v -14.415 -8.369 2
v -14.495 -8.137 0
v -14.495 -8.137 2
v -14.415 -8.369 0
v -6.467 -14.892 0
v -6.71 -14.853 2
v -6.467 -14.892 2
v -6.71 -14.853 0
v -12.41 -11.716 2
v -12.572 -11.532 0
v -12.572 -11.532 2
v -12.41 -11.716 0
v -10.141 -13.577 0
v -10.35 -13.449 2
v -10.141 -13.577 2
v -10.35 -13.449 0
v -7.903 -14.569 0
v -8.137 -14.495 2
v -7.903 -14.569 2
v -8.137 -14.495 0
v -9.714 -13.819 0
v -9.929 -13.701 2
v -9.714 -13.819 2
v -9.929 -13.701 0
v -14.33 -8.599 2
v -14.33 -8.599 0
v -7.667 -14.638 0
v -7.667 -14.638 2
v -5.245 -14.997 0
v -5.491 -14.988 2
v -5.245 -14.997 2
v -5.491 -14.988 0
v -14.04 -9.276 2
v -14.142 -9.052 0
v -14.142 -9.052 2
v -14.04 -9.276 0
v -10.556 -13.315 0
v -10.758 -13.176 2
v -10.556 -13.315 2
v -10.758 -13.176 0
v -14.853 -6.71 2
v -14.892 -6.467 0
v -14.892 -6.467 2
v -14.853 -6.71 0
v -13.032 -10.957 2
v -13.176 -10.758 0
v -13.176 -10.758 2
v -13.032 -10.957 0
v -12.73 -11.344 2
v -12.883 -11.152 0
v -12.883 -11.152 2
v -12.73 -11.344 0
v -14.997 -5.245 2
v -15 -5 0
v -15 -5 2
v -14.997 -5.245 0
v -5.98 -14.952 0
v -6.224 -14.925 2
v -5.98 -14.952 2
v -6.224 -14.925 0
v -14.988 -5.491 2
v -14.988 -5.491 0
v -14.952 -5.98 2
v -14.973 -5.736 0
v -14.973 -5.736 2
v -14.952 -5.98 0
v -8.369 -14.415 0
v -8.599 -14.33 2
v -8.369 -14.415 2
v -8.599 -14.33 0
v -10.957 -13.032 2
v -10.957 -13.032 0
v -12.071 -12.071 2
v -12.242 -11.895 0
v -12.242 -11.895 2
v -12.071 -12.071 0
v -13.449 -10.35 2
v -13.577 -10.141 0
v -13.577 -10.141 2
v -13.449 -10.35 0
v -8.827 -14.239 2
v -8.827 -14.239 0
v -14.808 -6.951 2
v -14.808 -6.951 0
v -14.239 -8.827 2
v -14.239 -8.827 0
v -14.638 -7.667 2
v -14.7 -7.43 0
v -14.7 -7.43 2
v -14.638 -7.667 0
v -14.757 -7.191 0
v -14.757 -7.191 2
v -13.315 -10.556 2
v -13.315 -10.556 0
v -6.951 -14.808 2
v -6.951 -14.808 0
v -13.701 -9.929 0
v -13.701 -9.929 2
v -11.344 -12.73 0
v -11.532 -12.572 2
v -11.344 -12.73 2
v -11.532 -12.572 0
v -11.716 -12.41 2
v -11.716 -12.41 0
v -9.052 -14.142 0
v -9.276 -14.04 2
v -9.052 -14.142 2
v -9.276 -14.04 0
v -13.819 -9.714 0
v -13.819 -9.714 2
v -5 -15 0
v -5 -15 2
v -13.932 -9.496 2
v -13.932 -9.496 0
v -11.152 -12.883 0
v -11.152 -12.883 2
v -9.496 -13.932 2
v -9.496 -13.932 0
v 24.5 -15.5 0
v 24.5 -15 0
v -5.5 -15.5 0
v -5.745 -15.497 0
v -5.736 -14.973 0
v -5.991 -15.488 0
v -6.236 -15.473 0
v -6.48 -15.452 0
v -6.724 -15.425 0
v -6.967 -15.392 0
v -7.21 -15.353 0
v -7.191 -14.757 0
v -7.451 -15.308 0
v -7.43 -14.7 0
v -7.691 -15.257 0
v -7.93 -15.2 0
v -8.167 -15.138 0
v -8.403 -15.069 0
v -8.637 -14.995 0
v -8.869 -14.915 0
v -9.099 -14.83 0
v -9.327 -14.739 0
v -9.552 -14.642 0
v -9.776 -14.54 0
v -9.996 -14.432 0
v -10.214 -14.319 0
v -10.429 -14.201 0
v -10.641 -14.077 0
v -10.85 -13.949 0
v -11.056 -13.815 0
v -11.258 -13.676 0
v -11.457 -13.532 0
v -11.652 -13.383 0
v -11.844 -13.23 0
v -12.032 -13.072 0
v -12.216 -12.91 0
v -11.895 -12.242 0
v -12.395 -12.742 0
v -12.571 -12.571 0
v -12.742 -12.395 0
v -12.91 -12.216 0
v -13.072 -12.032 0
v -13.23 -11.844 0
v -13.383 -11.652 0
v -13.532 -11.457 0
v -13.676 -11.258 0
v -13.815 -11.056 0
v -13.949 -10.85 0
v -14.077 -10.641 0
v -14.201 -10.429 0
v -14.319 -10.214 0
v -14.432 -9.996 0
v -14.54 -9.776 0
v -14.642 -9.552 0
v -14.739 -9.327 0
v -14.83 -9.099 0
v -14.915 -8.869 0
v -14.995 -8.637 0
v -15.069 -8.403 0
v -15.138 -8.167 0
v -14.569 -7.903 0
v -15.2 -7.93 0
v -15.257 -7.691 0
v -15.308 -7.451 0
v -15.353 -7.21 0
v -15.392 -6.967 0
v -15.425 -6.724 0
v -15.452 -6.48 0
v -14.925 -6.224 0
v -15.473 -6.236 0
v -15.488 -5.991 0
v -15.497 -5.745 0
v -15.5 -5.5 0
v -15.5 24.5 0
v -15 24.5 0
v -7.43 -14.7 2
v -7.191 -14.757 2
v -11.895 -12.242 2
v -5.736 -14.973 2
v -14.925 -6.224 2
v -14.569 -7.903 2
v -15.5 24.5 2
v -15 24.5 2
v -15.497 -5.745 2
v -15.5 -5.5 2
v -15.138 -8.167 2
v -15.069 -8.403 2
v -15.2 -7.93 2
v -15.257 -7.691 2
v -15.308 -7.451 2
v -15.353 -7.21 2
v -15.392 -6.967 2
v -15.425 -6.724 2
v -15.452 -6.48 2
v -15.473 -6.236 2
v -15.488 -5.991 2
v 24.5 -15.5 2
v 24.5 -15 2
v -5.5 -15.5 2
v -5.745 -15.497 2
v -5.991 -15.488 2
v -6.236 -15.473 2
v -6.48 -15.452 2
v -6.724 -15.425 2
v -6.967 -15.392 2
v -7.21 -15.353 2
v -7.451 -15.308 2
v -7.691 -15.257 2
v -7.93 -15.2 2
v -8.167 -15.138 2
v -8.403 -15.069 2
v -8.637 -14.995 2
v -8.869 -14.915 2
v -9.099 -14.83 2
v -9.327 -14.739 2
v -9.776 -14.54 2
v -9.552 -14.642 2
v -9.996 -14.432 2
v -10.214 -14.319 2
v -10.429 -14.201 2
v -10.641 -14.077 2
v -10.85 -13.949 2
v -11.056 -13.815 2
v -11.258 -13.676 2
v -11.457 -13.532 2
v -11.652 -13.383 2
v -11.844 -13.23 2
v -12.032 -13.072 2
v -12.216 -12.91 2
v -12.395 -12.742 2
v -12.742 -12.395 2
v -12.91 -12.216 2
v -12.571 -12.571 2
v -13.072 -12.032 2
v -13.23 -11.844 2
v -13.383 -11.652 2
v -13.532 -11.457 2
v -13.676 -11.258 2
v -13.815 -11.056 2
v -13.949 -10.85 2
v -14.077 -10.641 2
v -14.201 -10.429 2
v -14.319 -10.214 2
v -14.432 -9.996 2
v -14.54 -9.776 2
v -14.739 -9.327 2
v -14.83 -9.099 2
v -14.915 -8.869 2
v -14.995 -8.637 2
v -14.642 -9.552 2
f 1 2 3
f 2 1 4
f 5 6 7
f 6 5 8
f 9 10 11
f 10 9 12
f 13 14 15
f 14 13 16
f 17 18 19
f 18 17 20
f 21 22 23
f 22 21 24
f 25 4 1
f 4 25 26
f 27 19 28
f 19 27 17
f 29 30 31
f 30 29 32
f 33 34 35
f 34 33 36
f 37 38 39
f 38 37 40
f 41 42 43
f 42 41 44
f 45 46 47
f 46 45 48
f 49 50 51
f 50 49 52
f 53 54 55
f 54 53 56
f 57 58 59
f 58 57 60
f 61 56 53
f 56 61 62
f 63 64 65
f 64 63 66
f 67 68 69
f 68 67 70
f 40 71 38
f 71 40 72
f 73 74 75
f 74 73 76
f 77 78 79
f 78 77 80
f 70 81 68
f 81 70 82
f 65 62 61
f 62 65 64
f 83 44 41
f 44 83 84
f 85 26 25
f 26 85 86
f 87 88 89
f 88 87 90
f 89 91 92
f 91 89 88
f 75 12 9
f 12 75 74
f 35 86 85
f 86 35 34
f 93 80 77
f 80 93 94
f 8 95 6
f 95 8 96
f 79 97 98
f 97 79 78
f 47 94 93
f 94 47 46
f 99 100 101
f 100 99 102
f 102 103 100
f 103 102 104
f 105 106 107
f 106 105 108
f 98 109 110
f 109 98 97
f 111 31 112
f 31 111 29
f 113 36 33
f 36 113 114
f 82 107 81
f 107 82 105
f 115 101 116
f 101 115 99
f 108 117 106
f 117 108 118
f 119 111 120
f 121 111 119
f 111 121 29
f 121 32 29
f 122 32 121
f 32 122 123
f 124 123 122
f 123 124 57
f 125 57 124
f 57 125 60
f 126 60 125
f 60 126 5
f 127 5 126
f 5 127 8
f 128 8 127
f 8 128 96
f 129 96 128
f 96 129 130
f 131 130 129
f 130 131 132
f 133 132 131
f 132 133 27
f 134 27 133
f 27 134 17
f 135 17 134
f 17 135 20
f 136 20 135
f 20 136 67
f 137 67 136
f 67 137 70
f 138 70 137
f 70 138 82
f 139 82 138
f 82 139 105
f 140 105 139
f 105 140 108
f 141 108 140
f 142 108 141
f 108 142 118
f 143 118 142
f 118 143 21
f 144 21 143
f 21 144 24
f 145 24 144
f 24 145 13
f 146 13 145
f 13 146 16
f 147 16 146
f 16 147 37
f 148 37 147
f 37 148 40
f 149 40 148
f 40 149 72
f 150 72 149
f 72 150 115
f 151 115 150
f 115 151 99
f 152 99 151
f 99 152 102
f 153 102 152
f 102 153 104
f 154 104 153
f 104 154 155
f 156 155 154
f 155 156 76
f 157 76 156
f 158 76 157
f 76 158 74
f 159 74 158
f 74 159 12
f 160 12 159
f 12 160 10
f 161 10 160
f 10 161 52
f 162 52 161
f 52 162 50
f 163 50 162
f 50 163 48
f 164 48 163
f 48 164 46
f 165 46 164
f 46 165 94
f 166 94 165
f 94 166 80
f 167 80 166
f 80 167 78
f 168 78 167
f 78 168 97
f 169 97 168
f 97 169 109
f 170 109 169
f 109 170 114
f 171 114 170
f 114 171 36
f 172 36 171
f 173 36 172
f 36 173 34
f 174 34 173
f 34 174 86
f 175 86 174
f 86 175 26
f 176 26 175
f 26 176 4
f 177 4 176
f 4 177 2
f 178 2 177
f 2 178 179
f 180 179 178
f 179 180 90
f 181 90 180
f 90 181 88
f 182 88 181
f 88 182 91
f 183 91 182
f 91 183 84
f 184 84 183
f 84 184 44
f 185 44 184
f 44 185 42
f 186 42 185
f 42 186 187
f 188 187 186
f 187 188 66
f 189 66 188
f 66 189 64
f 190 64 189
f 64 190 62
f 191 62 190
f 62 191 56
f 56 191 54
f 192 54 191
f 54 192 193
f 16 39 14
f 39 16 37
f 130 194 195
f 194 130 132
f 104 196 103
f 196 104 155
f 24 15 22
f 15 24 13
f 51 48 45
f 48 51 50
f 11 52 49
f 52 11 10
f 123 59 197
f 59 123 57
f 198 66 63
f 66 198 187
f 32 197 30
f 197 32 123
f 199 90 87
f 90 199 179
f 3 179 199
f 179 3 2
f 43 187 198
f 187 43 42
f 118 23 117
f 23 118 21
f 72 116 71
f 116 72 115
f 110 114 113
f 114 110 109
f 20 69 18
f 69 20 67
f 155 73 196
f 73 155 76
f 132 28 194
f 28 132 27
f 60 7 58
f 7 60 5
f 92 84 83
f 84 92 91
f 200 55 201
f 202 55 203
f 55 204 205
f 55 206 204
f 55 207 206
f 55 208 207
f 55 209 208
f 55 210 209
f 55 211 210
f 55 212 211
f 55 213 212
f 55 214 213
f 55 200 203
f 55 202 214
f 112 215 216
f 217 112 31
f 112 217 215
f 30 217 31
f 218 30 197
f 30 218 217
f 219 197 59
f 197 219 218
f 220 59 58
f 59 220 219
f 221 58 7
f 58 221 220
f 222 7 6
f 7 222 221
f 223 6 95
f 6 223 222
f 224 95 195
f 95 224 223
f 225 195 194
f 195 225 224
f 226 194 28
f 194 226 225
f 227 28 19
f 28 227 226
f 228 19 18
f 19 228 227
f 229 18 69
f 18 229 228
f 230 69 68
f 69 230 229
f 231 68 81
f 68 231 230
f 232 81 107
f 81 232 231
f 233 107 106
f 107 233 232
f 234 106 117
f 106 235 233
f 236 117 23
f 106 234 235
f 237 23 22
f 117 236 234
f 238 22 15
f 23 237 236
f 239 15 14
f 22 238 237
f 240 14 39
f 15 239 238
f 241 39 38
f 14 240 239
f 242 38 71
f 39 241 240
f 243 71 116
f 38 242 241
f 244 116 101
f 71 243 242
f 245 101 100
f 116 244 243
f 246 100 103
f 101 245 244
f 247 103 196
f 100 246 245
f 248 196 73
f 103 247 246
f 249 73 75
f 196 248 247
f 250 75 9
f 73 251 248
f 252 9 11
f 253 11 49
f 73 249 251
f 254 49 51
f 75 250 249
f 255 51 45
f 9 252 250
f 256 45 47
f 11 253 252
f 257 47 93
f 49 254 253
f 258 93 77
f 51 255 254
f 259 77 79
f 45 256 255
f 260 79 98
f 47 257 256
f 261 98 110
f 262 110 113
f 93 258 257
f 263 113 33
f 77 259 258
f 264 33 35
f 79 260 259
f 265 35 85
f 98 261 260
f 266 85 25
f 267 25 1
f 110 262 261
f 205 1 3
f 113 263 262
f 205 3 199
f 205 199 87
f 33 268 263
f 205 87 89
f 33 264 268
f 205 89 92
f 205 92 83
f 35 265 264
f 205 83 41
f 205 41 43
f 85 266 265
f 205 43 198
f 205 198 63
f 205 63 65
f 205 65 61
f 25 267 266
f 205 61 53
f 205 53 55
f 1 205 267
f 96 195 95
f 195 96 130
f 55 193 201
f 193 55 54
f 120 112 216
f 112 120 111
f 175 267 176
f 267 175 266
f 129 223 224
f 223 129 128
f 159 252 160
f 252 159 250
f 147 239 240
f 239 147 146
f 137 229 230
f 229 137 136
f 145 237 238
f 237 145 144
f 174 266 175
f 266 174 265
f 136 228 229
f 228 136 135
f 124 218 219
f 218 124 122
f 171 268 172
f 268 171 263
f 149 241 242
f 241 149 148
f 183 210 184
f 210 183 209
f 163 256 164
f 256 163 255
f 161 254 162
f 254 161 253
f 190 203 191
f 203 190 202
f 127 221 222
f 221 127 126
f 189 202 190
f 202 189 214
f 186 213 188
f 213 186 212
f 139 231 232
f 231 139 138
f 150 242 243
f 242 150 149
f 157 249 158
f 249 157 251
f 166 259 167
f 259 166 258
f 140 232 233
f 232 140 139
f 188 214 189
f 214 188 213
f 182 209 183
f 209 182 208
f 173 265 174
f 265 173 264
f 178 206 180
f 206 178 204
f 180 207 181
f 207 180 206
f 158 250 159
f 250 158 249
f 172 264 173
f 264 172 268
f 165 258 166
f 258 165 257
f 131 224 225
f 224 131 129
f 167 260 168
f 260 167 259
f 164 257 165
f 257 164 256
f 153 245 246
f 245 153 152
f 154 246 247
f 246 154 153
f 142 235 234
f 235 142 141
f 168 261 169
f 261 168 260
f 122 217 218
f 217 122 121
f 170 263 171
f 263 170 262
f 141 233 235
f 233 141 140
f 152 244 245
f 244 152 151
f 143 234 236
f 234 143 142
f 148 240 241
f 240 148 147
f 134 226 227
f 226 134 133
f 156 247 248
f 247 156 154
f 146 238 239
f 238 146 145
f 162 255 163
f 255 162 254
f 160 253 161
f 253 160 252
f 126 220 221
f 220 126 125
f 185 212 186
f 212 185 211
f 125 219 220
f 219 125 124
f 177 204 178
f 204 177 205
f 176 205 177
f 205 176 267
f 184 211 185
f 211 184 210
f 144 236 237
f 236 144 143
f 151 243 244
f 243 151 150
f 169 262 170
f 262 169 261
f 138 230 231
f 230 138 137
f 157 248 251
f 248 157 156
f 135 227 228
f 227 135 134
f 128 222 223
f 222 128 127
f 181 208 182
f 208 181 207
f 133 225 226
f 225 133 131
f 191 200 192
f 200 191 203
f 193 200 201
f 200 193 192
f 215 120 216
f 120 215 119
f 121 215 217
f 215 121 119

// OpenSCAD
difference(){
    
    translate([-0.5,-0.5,0]){
    union() {
translate([-5,-5,0]) {
    cylinder(d=20, h=2, $fn=256);
    translate([-10,0,0]) {
        cube([10,30,2]);
    }
    
    translate([0,-10,0]) {
        cube([30,10,2]);
    }
}
}
}
union() {
translate([-5,-5,0]) {
    cylinder(d=20, h=2, $fn=256);
    translate([-10,0,0]) {
        cube([10,30,2]);
    }
    
    translate([0,-10,0]) {
        cube([30,10,2]);
    }
}
}


}
